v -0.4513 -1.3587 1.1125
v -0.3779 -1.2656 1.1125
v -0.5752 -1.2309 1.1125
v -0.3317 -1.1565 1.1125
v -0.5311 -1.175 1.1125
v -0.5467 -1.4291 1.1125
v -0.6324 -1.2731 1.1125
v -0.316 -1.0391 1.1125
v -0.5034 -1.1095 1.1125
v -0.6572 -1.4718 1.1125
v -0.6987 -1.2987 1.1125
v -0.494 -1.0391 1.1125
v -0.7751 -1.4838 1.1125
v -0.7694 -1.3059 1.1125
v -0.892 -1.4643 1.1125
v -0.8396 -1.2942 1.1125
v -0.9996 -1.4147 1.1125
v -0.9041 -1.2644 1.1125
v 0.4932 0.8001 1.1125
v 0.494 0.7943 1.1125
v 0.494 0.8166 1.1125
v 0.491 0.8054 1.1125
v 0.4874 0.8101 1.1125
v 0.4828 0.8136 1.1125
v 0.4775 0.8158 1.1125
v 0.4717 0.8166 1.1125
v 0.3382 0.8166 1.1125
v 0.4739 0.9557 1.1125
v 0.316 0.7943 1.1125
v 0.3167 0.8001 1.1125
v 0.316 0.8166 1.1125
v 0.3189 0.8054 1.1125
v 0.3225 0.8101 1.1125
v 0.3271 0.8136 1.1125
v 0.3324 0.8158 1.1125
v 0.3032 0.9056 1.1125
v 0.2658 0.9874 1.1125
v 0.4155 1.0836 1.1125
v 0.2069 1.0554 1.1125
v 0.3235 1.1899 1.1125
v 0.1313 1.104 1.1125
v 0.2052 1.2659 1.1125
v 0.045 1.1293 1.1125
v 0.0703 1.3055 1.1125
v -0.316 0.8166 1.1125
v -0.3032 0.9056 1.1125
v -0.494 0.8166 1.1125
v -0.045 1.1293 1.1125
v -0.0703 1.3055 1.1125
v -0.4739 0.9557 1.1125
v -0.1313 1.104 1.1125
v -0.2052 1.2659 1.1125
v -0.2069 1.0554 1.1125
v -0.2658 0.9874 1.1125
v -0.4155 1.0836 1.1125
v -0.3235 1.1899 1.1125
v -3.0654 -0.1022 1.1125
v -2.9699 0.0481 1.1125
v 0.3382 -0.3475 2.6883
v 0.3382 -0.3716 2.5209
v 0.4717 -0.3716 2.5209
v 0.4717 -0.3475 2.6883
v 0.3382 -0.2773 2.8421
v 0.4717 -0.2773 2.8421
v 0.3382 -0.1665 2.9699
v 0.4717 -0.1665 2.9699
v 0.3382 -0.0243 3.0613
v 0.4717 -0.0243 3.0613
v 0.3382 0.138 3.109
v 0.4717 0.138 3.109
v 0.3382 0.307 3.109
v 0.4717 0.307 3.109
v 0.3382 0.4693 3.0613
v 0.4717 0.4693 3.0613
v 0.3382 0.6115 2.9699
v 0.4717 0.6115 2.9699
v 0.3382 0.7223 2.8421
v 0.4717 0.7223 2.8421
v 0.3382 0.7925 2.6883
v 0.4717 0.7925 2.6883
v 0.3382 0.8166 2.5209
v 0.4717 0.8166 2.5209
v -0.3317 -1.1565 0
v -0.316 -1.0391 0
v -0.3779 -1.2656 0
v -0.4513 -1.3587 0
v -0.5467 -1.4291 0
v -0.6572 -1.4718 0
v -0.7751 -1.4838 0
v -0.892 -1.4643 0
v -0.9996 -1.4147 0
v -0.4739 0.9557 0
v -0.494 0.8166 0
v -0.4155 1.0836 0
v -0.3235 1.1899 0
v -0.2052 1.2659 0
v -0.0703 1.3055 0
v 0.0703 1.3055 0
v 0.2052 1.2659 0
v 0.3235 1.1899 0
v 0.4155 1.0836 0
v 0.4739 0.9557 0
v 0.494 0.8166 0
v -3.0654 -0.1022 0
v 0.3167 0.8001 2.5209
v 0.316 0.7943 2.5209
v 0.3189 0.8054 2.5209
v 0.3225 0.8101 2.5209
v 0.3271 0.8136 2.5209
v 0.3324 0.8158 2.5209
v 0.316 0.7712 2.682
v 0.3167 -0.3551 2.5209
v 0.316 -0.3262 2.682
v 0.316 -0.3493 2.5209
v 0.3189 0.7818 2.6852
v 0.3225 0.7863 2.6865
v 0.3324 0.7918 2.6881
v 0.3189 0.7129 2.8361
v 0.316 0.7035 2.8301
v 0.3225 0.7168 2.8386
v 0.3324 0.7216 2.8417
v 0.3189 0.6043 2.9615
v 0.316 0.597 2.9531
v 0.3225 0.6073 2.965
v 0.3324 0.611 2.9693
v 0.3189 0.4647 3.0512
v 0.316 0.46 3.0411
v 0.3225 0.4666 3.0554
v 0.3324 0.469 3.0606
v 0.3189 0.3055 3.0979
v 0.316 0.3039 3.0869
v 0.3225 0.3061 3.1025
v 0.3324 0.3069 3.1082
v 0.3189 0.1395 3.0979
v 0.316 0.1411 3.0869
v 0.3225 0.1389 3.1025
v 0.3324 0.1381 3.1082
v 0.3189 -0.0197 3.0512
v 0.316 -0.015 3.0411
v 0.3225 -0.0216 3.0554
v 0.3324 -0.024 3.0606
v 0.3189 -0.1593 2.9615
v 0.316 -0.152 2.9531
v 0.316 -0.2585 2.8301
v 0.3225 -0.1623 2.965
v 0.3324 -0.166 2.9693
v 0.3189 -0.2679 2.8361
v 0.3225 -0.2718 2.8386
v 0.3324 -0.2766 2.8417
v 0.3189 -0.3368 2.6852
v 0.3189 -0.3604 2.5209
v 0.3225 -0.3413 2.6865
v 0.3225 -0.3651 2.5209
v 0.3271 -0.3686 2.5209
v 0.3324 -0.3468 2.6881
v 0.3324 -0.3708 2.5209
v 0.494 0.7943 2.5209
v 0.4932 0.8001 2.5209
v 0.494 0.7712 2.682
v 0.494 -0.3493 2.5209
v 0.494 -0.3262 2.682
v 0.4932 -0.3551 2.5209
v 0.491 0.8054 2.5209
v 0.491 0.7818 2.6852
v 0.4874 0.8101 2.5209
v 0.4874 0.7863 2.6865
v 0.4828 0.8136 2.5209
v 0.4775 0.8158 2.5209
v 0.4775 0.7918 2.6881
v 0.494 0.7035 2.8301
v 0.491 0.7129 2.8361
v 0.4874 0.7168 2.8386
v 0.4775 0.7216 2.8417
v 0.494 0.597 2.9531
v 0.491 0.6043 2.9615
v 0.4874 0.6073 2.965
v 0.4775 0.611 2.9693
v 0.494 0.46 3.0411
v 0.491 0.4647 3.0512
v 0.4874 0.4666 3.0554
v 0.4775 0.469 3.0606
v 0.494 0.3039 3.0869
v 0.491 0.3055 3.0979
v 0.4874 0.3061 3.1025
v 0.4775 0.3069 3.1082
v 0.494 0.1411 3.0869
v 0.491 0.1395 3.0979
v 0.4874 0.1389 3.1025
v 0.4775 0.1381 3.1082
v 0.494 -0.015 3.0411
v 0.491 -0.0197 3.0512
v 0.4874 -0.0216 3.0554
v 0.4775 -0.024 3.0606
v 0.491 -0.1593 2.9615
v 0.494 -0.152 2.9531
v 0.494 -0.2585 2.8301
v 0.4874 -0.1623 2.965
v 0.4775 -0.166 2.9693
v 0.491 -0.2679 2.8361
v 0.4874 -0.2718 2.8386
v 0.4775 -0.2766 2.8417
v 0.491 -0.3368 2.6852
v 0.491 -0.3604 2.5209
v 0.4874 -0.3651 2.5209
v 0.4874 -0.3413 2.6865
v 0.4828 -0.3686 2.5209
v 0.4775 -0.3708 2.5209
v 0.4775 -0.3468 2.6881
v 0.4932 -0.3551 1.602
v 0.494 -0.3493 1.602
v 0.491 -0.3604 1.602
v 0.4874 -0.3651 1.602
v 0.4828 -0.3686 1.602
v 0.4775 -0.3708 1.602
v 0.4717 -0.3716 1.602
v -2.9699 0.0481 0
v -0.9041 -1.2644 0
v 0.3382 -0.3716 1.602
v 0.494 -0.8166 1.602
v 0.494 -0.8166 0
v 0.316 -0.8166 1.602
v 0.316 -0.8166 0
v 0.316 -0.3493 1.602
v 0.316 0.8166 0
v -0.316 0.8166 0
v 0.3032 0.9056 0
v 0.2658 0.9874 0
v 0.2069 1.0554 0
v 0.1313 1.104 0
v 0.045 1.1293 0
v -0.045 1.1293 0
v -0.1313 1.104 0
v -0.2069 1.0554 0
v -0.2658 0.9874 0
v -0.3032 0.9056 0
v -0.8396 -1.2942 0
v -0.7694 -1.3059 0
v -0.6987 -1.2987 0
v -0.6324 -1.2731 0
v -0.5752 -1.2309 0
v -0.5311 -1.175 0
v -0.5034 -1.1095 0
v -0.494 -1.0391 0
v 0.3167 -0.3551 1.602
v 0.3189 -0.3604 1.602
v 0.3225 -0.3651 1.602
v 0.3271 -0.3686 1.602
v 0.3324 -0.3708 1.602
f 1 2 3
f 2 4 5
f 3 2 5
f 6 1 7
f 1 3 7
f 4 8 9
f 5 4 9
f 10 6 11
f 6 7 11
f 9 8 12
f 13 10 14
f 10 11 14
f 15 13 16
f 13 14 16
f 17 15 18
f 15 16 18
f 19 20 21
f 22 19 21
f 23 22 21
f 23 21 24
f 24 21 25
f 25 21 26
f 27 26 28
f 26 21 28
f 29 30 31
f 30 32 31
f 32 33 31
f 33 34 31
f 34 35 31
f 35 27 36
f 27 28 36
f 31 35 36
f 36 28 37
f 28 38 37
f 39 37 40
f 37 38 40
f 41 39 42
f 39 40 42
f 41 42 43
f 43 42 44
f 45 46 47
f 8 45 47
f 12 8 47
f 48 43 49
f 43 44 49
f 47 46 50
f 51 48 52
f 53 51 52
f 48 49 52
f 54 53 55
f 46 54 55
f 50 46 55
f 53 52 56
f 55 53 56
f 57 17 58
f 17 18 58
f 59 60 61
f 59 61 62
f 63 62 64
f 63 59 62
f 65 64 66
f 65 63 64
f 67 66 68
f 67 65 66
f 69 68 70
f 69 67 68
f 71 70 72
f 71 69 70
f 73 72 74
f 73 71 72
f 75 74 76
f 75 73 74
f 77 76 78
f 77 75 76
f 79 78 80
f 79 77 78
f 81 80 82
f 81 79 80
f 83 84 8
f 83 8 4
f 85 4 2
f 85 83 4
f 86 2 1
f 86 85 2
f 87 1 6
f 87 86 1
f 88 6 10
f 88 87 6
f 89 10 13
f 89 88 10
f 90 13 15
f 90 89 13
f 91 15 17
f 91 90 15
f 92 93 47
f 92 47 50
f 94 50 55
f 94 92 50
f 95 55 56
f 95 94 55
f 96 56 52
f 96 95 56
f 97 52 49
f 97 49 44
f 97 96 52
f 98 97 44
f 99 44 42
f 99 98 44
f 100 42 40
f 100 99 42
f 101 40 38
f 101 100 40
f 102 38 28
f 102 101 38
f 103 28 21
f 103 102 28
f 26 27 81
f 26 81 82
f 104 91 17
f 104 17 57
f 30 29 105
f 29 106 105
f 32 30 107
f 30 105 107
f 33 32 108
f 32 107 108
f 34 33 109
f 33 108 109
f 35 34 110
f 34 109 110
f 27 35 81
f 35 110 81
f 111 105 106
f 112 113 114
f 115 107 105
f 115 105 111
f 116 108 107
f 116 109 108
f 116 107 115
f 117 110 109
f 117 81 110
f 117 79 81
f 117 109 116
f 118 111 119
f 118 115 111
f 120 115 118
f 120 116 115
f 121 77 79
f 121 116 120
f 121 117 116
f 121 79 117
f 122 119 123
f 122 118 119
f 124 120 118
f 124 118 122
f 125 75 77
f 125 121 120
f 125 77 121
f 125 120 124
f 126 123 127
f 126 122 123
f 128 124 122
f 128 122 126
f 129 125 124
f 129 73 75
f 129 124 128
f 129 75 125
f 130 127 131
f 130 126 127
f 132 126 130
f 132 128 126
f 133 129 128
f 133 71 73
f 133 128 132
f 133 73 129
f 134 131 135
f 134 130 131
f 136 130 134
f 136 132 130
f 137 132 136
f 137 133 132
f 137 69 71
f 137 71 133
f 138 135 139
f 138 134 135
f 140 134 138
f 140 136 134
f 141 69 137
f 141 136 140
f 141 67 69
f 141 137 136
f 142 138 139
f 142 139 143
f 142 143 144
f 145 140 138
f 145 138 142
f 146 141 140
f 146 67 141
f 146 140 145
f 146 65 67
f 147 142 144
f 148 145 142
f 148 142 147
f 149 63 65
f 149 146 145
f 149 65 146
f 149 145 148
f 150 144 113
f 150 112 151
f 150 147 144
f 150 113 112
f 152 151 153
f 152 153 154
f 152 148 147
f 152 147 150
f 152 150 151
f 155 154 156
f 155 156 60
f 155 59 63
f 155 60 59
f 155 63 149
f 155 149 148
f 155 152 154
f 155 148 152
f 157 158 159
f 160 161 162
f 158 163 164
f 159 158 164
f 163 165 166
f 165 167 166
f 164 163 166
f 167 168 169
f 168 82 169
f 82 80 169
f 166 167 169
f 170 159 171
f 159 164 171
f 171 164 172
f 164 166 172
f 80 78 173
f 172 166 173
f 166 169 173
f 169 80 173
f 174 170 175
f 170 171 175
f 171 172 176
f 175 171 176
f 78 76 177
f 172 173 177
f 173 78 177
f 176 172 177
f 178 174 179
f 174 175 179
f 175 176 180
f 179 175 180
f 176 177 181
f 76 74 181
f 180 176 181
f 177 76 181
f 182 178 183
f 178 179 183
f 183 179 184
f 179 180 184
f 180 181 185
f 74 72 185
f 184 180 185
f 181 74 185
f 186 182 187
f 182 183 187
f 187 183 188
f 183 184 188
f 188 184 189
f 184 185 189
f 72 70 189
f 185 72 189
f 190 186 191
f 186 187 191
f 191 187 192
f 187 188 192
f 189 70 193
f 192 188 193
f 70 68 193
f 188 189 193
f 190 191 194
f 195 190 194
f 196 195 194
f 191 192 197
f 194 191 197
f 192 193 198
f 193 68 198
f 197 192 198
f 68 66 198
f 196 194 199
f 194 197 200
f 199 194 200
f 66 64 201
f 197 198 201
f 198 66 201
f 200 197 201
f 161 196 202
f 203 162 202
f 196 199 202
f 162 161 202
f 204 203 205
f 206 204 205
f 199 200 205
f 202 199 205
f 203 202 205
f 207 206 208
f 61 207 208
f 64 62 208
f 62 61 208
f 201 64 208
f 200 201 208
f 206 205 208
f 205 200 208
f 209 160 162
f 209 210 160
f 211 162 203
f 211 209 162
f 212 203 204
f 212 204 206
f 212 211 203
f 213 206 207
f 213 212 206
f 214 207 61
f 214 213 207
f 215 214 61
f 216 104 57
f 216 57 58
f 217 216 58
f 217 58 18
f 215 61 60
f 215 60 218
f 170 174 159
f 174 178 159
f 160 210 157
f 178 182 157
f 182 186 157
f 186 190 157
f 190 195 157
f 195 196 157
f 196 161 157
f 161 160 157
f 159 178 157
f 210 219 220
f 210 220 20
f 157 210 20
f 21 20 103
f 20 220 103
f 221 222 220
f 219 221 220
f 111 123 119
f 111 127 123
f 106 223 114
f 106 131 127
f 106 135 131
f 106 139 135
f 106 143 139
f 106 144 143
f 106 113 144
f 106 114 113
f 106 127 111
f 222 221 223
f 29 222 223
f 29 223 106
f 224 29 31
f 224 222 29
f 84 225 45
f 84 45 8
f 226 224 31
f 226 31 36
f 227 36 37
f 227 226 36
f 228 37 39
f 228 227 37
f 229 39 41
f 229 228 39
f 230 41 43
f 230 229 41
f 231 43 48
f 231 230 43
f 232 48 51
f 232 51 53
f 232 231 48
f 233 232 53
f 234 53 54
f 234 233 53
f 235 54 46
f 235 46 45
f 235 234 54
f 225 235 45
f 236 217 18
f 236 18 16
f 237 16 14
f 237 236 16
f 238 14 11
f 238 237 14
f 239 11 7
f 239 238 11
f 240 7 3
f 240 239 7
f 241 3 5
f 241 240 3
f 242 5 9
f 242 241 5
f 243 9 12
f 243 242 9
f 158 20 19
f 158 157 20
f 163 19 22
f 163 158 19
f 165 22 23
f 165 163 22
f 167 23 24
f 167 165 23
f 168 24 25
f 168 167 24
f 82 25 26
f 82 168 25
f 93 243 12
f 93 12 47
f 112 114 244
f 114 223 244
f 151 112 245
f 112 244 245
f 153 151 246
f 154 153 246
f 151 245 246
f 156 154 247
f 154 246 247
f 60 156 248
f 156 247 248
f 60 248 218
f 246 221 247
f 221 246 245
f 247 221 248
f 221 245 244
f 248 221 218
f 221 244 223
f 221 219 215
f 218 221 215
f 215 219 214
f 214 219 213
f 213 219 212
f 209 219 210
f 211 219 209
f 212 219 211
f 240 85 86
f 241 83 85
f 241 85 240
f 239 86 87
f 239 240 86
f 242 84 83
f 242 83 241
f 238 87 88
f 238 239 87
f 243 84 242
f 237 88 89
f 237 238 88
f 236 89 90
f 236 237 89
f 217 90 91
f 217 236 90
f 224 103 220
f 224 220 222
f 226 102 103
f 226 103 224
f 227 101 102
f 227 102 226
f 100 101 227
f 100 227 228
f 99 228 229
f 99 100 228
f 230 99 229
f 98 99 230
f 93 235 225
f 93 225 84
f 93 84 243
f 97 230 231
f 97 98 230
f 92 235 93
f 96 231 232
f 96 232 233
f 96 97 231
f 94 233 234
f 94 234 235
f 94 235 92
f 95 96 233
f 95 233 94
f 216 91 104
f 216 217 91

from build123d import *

# Parameters (mm, degrees)
BASE_FLANGE1_DEPTH  = 2.5
SKETCH6_W           = 0.4
SKETCH6_H           = 3.67
BOSS_EXTRUDE1_DEPTH = 4.5
SKETCH7_W           = 3.4
SKETCH7_H           = 1
CUT_EXTRUDE1_DEPTH  = 12.139958989
FILLET1_RADIUS      = 1.335
FILLET1_LENGTH      = 0.4
FILLET2_R           = 0.05
SCALE1_SCALE        = 0.445


# Sheet-metal steps are written as plain solids
with BuildPart() as part:
    # Sketch1 → Base-Flange1 (new body)
    with BuildSketch(Plane.XY):
        with BuildLine():
            Line((0.71, -1.835), (0.71, 1.835))
            ThreePointArc((0.71, 1.835), (0, 2.545), (-0.71, 1.835))
            Line((-0.71, 1.835), (-0.71, -2.335))
            ThreePointArc((-0.71, -2.335), (-1.228475759, -3.211432773), (-2.246268811, -3.179047252))
            Line((-2.246268811, -3.179047252), (-6.888528694, -0.229568793))
            Line((-6.888528694, -0.229568793), (-6.67402117, 0.108050107))
            Line((-6.67402117, 0.108050107), (-2.031761286, -2.841428351))
            ThreePointArc((-2.031761286, -2.841428351), (-1.421085455, -2.860859664), (-1.11, -2.335))
            Line((-1.11, -2.335), (-1.11, 1.835))
            ThreePointArc((-1.11, 1.835), (0, 2.945), (1.11, 1.835))
            Line((1.11, 1.835), (1.11, -1.835))
            Line((1.11, -1.835), (0.71, -1.835))
        make_face()
    extrude(amount=BASE_FLANGE1_DEPTH)

    # Sketch6 → Boss-Extrude1 (add)
    with BuildSketch(Plane.XY.offset(2.5)):
        with Locations((0.91, 0)):
            Rectangle(SKETCH6_W, SKETCH6_H)
    extrude(amount=BOSS_EXTRUDE1_DEPTH)

    # Sketch7 → Cut-Extrude1 (cut, through all)
    with BuildSketch(Plane(origin=(1.11, 0, 0), x_dir=(0, 0, -1), z_dir=(1, 0, 0))):
        with Locations((-5.3, -1.335)):
            Rectangle(SKETCH7_W, SKETCH7_H)
    extrude(amount=-CUT_EXTRUDE1_DEPTH, mode=Mode.SUBTRACT)

    # Fillet1: full round fillet: the end face becomes a half cylinder, R = half its width
    fillet1_face = Plane((0.91, 0.5, 7), x_dir=(-1, 0, 0), z_dir=(0, 0, 1))  # on the end face: x along it, z out of the body
    fillet1_slab = fillet1_face.offset(-FILLET1_RADIUS / 2) * Box(FILLET1_LENGTH, 2 * FILLET1_RADIUS, FILLET1_RADIUS, mode=Mode.PRIVATE)  # the body's end, R deep
    fillet1_round = Plane((0.91, 0.5, 5.665), x_dir=(0, 0, 1), z_dir=(-1, 0, 0)) * Cylinder(FILLET1_RADIUS, FILLET1_LENGTH, mode=Mode.PRIVATE)  # its axis R under the face
    add(fillet1_slab - fillet1_round, mode=Mode.SUBTRACT)

    # Fillet2
    fillet2_edges = [part.edges().sort_by_distance(p)[0] for p in [
        (0.71, 1.835, 4.0825),
        (1.11, 1.835, 4.0825),
        (0.71, -0.835, 4.6325),
        (1.11, -0.835, 4.6325),
        (0.71, 0.5, 7),
        (1.11, 0.5, 7),
    ]]
    fillet(fillet2_edges, radius=FILLET2_R)


with BuildPart() as part_1:
    # Scale1: scaled about (0, 0, 0)
    add(part.part.scale(SCALE1_SCALE))


solid = part_1.part
